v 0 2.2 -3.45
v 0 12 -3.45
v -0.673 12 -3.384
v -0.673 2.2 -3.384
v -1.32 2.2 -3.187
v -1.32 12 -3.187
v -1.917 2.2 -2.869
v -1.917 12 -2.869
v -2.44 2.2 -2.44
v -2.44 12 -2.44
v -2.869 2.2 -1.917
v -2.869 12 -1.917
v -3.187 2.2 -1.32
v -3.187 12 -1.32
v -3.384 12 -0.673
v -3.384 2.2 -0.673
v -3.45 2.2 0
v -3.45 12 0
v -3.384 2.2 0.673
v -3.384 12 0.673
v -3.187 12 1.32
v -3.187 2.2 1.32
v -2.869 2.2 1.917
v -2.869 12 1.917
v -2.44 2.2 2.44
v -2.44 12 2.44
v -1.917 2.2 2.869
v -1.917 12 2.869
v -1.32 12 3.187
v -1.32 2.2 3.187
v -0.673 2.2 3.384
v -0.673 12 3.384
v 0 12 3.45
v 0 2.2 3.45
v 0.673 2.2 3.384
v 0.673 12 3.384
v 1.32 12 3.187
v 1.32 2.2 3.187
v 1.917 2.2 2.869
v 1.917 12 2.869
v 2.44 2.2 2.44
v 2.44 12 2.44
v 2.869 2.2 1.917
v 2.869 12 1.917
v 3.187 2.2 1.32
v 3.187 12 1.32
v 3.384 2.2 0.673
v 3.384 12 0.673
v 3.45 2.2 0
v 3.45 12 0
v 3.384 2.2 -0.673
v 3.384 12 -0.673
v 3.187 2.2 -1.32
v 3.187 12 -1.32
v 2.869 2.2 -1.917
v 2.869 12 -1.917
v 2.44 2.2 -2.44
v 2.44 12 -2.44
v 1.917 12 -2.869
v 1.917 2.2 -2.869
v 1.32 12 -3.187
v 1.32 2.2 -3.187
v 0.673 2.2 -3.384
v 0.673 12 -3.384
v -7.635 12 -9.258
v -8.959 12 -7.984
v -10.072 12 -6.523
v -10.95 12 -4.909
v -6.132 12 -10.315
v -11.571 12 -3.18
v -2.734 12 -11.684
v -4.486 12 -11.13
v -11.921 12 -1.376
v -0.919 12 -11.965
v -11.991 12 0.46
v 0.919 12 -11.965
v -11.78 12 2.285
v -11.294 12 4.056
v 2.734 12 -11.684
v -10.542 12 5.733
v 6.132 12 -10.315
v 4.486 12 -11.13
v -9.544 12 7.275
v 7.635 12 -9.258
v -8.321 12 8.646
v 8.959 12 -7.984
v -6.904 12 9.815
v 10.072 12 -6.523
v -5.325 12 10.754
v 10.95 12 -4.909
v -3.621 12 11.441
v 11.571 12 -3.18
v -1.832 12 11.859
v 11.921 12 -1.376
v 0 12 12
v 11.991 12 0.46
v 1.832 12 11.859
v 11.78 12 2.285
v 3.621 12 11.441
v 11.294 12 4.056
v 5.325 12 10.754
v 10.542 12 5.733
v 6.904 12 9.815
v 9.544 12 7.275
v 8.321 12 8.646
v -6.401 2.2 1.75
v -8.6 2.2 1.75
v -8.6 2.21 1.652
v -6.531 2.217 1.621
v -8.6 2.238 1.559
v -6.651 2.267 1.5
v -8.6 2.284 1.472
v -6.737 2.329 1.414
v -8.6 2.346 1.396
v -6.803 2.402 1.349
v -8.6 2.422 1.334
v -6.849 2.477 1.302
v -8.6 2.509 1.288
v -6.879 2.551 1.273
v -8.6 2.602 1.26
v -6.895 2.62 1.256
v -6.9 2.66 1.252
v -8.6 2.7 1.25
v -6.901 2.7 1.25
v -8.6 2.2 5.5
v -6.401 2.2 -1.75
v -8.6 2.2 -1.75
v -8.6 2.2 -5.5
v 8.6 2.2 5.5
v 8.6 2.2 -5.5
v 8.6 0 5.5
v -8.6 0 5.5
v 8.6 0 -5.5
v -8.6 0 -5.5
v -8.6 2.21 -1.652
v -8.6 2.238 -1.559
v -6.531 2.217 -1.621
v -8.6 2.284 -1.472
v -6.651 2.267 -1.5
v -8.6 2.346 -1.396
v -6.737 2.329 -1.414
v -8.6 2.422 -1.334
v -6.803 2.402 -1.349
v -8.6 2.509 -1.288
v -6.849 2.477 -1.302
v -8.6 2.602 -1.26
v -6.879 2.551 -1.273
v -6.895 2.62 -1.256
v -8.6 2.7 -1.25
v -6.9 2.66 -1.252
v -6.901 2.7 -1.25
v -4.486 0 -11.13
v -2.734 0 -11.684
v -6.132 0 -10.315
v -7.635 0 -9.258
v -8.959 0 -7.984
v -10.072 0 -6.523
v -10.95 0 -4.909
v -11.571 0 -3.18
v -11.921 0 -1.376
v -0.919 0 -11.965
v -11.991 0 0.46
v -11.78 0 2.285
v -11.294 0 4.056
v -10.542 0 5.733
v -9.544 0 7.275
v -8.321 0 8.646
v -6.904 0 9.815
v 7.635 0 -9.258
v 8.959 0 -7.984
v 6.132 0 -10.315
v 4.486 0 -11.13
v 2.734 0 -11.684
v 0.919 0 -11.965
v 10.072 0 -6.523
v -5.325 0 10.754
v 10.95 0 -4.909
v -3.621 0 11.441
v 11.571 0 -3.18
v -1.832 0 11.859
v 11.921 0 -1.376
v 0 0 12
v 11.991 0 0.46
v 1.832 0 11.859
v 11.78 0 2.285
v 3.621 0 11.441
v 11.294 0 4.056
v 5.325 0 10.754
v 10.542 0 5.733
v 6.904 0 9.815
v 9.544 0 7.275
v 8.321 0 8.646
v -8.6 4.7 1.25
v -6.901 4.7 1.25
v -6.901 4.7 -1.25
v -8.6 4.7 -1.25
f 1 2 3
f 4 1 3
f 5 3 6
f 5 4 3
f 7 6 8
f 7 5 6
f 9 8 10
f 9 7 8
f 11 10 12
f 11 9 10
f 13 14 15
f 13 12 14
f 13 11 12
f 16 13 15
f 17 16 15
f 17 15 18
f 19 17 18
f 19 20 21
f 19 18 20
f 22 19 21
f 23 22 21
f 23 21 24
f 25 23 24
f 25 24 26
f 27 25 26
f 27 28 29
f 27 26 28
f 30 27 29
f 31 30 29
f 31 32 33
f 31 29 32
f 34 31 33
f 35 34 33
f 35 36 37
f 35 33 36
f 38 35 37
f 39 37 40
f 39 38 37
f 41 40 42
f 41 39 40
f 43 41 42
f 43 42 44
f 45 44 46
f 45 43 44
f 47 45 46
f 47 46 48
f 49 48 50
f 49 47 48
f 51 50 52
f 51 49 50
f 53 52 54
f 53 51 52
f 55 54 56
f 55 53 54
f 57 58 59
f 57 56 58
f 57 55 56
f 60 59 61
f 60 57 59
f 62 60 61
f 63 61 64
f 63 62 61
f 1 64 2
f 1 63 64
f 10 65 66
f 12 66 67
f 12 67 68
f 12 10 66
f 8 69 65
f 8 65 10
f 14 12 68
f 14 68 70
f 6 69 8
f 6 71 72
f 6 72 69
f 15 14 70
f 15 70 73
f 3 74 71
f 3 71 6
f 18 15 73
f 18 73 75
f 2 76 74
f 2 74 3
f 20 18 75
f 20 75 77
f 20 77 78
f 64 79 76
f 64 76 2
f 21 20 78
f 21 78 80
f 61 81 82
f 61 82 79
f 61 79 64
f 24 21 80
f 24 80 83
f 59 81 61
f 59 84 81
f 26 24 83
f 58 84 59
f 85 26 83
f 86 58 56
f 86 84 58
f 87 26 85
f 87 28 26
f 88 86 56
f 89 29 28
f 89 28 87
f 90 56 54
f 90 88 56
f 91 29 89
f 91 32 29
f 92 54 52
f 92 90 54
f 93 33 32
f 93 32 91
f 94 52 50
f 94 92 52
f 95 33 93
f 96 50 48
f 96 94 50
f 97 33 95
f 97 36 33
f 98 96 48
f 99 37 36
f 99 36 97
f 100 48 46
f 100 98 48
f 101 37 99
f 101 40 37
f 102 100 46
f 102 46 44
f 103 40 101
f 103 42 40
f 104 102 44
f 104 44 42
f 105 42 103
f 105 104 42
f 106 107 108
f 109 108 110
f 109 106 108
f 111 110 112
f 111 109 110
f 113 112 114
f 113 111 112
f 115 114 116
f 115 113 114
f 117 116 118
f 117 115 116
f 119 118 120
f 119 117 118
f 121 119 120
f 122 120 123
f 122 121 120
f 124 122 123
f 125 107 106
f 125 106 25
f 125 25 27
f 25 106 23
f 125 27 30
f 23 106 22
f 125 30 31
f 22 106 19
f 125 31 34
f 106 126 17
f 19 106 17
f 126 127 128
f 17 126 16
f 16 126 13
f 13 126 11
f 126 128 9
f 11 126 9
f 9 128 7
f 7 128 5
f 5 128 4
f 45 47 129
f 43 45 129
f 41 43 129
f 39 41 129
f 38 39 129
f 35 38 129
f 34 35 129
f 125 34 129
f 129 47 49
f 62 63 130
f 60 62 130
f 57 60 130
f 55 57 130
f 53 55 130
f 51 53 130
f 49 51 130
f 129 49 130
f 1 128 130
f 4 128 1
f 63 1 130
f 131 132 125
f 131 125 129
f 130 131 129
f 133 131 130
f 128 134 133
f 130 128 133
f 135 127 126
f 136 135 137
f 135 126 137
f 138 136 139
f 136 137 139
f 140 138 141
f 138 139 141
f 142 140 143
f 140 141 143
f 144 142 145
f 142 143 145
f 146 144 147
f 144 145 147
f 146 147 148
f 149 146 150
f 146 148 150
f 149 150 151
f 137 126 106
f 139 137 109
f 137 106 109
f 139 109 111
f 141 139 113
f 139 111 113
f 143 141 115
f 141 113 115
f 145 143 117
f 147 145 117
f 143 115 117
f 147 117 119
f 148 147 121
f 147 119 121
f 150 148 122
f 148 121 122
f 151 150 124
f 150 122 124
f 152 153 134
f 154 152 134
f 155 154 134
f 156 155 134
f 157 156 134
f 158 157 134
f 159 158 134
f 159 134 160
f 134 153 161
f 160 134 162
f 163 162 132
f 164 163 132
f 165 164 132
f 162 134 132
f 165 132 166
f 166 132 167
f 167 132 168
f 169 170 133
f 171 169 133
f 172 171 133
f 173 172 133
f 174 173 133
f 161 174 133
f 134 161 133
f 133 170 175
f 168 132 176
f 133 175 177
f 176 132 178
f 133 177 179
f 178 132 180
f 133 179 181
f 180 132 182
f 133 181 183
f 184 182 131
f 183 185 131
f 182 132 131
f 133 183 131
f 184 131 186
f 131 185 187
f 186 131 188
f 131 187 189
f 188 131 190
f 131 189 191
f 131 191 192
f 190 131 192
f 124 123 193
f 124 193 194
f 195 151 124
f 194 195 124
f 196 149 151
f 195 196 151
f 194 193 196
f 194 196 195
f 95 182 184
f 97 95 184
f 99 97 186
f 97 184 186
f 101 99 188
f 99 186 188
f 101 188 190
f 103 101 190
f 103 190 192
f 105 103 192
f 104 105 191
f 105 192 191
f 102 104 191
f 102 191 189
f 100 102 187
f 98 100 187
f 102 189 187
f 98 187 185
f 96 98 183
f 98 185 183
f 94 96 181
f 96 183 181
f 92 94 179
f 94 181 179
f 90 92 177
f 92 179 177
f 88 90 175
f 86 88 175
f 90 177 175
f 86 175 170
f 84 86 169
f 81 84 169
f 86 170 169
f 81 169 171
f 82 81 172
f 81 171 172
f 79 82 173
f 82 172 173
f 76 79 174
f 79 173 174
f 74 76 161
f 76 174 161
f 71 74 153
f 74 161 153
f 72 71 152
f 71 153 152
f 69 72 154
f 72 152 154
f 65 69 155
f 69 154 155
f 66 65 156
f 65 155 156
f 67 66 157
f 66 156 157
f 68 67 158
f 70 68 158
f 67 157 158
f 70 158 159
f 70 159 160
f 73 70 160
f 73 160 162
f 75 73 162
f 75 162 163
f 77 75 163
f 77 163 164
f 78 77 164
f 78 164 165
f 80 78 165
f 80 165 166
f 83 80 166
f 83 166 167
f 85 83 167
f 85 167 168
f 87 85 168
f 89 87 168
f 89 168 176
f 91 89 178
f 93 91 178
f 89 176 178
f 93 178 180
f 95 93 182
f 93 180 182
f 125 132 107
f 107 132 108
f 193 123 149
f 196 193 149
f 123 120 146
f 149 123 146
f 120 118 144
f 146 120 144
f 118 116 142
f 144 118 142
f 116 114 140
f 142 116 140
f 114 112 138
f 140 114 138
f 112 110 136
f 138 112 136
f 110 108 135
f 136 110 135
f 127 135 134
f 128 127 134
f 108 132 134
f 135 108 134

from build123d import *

# Parameters (mm, degrees)
SKETCH3_R           = 12
BOSS_EXTRUDE1_DEPTH = 12
SKETCH2_W           = 17.2
SKETCH2_H           = 11
CUT_EXTRUDE1_DEPTH  = 2.2
SKETCH4_R           = 3.45
CUT_EXTRUDE2_DEPTH  = 21.784609691
SKETCH5_W           = 1.698676218
SKETCH5_H           = 2.5
CUT_EXTRUDE3_DEPTH  = 2.5
FILLET1_R           = 0.5


with BuildPart() as part:
    # Sketch3 → Boss-Extrude1 (new body)
    with BuildSketch(Plane(origin=(0, 0, 0), x_dir=(1, 0, 0), z_dir=(0, 1, 0))):
        with Locations(Location((0, 0, 0), (0, 0, 270))):
            Circle(SKETCH3_R)
    extrude(amount=BOSS_EXTRUDE1_DEPTH)

    # Sketch2 → Cut-Extrude1 (cut)
    with BuildSketch(Plane(origin=(0, 0, 0), x_dir=(1, 0, 0), z_dir=(0, 1, 0))):
        Rectangle(SKETCH2_W, SKETCH2_H)
    extrude(amount=CUT_EXTRUDE1_DEPTH, mode=Mode.SUBTRACT)

    # Sketch4 → Cut-Extrude2 (cut, through all)
    with BuildSketch(Plane(origin=(0, 0, 0), x_dir=(1, 0, 0), z_dir=(0, 1, 0))):
        with Locations(Location((0, 0, 0), (0, 0, 90))):
            Circle(SKETCH4_R)
    extrude(amount=CUT_EXTRUDE2_DEPTH, mode=Mode.SUBTRACT)

    # Sketch5 → Cut-Extrude3 (cut)
    with BuildSketch(Plane.XZ.offset(-2.2)):
        with Locations((-7.750661891, 0)):
            Rectangle(SKETCH5_W, SKETCH5_H)
    extrude(amount=-CUT_EXTRUDE3_DEPTH, mode=Mode.SUBTRACT)

    # Fillet1
    fillet1_edges = [part.edges().sort_by_distance(p)[0] for p in [
        (-7.750661891, 2.2, -1.25),
        (-6.901323782, 2.2, 0),
        (-7.750661891, 2.2, 1.25),
    ]]
    fillet(fillet1_edges, radius=FILLET1_R)


solid = part.part
